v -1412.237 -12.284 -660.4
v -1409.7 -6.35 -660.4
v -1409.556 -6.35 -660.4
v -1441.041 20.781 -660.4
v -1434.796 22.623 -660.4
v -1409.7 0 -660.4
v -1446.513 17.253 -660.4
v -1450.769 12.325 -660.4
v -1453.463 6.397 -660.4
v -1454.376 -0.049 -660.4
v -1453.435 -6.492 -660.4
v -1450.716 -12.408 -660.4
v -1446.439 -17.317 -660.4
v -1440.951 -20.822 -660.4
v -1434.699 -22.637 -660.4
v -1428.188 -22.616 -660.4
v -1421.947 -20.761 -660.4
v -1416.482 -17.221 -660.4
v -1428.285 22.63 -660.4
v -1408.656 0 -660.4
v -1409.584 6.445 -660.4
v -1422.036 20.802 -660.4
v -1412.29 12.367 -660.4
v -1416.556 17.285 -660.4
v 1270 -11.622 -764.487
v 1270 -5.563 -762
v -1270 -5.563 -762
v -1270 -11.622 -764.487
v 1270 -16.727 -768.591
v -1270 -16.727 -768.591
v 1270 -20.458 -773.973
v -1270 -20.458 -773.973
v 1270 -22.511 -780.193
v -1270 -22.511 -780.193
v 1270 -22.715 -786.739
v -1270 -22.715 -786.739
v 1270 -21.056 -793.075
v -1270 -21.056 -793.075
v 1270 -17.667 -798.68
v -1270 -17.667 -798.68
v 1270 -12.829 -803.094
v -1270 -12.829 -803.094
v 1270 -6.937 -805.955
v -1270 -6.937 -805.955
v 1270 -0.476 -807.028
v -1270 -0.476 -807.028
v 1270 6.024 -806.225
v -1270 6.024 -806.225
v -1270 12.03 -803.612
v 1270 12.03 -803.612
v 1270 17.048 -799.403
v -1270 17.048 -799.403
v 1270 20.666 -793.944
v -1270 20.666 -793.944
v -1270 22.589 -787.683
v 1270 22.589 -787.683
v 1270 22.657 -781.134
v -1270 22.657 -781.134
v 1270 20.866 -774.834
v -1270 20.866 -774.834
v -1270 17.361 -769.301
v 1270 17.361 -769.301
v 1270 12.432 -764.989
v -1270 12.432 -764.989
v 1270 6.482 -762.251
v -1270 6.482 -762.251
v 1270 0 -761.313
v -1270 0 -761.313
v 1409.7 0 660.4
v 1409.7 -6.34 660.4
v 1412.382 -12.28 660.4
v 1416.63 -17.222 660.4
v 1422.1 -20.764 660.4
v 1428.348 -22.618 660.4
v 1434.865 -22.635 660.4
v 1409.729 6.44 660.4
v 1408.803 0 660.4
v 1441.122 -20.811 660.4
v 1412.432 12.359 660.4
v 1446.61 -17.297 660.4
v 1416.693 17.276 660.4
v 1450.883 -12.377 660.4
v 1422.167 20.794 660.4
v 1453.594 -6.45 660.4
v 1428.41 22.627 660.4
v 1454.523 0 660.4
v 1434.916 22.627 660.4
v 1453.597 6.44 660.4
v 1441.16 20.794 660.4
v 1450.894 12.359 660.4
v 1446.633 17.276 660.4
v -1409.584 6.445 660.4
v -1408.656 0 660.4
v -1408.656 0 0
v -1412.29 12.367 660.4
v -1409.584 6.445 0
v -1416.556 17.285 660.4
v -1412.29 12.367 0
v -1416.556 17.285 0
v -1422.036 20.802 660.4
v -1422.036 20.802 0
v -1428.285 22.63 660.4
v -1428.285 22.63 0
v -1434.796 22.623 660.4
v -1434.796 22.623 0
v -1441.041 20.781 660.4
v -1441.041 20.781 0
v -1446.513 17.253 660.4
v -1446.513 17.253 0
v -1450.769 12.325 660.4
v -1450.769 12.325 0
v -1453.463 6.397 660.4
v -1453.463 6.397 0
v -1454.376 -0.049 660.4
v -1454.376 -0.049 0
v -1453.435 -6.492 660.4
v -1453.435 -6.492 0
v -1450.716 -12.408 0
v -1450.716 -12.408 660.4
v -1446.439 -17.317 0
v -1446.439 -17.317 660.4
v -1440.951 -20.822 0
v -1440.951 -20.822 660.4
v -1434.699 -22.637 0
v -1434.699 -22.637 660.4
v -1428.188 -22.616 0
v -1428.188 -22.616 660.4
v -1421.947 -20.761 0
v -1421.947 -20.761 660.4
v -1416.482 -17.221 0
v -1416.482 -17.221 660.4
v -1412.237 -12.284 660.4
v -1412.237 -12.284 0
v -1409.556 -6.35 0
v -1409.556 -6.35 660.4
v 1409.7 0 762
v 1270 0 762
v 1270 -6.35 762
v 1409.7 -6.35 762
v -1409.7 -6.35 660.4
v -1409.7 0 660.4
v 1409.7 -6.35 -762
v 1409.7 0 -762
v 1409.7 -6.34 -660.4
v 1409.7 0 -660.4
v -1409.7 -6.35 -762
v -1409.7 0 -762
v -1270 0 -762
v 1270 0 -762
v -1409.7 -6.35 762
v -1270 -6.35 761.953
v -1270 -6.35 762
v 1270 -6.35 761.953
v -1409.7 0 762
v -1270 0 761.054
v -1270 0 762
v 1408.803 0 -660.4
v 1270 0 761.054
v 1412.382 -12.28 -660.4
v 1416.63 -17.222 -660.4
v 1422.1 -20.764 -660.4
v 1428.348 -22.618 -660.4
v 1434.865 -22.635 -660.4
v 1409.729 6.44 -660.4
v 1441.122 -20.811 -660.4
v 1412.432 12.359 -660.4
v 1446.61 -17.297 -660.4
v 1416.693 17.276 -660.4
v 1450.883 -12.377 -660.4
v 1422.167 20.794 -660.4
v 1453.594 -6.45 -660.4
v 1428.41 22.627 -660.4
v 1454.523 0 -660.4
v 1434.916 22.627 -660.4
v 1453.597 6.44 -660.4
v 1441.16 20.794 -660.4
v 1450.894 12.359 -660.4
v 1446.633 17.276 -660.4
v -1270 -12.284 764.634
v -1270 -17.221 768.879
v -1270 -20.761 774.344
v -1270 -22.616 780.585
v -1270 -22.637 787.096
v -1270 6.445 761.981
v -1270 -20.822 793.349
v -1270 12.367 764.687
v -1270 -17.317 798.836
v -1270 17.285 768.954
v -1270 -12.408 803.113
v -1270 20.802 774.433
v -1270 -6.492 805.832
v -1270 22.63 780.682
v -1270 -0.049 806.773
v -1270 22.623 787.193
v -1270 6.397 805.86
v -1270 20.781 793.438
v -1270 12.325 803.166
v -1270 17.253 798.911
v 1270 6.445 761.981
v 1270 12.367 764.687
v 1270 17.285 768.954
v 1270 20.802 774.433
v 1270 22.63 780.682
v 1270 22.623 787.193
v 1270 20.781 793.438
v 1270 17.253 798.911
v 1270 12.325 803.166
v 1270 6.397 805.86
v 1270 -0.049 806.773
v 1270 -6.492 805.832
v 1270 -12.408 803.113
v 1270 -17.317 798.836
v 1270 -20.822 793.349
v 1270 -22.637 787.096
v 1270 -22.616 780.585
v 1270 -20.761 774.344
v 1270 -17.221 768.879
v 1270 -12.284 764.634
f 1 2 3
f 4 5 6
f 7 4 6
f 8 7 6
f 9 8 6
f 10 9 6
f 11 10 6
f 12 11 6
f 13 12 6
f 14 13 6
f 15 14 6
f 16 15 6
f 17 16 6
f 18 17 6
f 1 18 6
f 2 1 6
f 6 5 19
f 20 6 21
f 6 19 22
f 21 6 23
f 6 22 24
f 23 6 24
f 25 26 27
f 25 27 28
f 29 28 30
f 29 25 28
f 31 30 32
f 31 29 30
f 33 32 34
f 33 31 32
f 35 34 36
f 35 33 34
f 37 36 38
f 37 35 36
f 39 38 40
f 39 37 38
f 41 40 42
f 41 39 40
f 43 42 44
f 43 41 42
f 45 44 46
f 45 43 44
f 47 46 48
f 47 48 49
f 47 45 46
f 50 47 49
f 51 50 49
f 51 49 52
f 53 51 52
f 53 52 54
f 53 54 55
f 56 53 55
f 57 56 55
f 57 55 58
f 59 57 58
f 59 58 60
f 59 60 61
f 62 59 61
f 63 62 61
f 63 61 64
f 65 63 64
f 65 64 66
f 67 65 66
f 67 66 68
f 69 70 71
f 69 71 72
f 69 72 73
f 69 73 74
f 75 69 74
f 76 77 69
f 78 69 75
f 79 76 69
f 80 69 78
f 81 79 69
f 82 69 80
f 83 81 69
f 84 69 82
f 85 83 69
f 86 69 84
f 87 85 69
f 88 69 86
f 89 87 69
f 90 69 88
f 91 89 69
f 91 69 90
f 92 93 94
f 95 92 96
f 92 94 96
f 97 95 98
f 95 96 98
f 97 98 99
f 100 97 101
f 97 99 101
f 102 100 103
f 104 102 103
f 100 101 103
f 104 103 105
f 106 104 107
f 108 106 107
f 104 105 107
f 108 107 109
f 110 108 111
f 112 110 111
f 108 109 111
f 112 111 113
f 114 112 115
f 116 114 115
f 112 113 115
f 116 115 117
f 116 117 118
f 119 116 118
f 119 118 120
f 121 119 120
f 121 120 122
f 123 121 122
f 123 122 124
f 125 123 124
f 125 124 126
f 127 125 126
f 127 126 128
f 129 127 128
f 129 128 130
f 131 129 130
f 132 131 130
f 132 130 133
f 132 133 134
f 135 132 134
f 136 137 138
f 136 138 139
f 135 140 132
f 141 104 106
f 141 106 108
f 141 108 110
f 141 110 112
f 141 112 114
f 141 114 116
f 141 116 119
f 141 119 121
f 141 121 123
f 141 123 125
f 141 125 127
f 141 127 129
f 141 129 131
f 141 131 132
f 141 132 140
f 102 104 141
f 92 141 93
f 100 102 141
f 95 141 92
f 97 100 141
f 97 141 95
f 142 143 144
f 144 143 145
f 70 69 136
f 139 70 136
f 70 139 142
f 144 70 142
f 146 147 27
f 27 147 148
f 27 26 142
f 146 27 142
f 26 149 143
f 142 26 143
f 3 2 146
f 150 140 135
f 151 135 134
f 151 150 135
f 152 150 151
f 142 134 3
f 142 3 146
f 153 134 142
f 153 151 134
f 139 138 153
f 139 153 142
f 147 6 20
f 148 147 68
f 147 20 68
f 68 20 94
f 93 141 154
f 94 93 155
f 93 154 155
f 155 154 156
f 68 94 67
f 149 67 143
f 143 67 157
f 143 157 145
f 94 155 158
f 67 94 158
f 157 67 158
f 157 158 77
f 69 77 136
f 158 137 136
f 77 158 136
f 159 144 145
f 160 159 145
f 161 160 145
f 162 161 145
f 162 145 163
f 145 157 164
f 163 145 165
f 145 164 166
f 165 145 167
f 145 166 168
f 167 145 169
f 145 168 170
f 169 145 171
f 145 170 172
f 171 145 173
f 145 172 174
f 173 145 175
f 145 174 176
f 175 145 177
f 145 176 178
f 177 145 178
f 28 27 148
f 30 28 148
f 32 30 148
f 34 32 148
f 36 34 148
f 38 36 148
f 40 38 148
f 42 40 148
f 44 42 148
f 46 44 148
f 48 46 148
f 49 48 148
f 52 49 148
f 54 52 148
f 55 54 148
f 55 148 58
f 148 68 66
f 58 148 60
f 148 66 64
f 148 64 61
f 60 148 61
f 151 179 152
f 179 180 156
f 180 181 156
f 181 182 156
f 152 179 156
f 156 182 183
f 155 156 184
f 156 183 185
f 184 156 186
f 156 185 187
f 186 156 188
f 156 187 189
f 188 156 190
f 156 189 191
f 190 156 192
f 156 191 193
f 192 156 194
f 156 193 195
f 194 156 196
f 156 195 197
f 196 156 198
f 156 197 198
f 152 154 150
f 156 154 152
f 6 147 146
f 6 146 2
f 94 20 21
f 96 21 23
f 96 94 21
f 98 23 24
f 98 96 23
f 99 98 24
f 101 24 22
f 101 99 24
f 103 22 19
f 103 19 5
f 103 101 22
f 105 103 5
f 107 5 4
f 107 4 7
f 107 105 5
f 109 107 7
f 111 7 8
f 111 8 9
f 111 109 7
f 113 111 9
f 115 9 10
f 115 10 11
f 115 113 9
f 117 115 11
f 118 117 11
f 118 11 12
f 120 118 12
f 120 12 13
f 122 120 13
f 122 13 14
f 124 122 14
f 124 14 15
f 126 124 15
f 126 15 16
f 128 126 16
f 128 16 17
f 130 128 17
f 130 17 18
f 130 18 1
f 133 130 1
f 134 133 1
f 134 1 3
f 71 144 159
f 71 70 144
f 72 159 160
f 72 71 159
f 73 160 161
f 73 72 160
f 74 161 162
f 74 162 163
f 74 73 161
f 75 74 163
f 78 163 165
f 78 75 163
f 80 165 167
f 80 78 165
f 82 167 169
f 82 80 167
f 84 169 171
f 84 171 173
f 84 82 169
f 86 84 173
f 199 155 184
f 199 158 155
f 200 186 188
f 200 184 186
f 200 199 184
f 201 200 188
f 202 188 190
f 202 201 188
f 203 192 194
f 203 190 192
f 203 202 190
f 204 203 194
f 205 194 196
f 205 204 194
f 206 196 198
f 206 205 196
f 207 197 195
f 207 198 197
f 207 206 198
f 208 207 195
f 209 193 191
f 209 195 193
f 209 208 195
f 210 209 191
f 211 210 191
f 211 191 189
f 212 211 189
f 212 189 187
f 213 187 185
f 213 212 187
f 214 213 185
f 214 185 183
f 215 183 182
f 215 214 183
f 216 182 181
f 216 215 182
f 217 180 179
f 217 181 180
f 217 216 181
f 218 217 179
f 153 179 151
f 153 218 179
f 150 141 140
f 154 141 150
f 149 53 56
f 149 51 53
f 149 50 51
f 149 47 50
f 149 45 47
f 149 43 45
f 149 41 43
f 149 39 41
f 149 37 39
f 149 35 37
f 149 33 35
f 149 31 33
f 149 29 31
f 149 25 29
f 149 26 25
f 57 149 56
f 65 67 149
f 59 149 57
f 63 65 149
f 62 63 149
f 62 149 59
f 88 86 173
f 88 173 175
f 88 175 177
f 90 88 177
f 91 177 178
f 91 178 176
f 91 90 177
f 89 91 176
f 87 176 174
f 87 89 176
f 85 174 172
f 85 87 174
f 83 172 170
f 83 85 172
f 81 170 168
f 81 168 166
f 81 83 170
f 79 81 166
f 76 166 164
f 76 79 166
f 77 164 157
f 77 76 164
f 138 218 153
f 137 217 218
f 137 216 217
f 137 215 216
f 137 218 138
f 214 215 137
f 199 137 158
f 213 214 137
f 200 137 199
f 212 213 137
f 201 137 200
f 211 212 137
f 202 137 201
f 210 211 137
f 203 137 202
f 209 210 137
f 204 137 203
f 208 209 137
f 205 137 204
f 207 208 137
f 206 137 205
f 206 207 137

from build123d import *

# Parameters (mm, degrees)
F0_W     = 2819.4
F0_H     = 1524
F2_DEPTH = 6.35
F1_R     = 22.86
F3_DEPTH = 1270
F4_R     = 22.86
F5_DEPTH = 660.4


with BuildPart() as f2:
    # F0 (on Front) → F2 (new body)
    with BuildSketch(Plane.XZ):
        Rectangle(F0_W, F0_H)
    extrude(amount=F2_DEPTH)

    # F1 (on Right) → F3 (join, symmetric)
    with BuildSketch(Plane.YZ):
        with Locations((0, 783.913553)):
            Circle(F1_R)
        with Locations((0, -784.172714)):
            Circle(F1_R)
    extrude(amount=F3_DEPTH, both=True)

    # F4 (on Top) → F5 (join, symmetric)
    with BuildSketch(Plane.XY):
        with Locations((-1431.51629, 0)):
            Circle(F4_R)
        with Locations((1431.663156, 0)):
            Circle(F4_R)
    extrude(amount=F5_DEPTH, both=True)


solid = f2.part
